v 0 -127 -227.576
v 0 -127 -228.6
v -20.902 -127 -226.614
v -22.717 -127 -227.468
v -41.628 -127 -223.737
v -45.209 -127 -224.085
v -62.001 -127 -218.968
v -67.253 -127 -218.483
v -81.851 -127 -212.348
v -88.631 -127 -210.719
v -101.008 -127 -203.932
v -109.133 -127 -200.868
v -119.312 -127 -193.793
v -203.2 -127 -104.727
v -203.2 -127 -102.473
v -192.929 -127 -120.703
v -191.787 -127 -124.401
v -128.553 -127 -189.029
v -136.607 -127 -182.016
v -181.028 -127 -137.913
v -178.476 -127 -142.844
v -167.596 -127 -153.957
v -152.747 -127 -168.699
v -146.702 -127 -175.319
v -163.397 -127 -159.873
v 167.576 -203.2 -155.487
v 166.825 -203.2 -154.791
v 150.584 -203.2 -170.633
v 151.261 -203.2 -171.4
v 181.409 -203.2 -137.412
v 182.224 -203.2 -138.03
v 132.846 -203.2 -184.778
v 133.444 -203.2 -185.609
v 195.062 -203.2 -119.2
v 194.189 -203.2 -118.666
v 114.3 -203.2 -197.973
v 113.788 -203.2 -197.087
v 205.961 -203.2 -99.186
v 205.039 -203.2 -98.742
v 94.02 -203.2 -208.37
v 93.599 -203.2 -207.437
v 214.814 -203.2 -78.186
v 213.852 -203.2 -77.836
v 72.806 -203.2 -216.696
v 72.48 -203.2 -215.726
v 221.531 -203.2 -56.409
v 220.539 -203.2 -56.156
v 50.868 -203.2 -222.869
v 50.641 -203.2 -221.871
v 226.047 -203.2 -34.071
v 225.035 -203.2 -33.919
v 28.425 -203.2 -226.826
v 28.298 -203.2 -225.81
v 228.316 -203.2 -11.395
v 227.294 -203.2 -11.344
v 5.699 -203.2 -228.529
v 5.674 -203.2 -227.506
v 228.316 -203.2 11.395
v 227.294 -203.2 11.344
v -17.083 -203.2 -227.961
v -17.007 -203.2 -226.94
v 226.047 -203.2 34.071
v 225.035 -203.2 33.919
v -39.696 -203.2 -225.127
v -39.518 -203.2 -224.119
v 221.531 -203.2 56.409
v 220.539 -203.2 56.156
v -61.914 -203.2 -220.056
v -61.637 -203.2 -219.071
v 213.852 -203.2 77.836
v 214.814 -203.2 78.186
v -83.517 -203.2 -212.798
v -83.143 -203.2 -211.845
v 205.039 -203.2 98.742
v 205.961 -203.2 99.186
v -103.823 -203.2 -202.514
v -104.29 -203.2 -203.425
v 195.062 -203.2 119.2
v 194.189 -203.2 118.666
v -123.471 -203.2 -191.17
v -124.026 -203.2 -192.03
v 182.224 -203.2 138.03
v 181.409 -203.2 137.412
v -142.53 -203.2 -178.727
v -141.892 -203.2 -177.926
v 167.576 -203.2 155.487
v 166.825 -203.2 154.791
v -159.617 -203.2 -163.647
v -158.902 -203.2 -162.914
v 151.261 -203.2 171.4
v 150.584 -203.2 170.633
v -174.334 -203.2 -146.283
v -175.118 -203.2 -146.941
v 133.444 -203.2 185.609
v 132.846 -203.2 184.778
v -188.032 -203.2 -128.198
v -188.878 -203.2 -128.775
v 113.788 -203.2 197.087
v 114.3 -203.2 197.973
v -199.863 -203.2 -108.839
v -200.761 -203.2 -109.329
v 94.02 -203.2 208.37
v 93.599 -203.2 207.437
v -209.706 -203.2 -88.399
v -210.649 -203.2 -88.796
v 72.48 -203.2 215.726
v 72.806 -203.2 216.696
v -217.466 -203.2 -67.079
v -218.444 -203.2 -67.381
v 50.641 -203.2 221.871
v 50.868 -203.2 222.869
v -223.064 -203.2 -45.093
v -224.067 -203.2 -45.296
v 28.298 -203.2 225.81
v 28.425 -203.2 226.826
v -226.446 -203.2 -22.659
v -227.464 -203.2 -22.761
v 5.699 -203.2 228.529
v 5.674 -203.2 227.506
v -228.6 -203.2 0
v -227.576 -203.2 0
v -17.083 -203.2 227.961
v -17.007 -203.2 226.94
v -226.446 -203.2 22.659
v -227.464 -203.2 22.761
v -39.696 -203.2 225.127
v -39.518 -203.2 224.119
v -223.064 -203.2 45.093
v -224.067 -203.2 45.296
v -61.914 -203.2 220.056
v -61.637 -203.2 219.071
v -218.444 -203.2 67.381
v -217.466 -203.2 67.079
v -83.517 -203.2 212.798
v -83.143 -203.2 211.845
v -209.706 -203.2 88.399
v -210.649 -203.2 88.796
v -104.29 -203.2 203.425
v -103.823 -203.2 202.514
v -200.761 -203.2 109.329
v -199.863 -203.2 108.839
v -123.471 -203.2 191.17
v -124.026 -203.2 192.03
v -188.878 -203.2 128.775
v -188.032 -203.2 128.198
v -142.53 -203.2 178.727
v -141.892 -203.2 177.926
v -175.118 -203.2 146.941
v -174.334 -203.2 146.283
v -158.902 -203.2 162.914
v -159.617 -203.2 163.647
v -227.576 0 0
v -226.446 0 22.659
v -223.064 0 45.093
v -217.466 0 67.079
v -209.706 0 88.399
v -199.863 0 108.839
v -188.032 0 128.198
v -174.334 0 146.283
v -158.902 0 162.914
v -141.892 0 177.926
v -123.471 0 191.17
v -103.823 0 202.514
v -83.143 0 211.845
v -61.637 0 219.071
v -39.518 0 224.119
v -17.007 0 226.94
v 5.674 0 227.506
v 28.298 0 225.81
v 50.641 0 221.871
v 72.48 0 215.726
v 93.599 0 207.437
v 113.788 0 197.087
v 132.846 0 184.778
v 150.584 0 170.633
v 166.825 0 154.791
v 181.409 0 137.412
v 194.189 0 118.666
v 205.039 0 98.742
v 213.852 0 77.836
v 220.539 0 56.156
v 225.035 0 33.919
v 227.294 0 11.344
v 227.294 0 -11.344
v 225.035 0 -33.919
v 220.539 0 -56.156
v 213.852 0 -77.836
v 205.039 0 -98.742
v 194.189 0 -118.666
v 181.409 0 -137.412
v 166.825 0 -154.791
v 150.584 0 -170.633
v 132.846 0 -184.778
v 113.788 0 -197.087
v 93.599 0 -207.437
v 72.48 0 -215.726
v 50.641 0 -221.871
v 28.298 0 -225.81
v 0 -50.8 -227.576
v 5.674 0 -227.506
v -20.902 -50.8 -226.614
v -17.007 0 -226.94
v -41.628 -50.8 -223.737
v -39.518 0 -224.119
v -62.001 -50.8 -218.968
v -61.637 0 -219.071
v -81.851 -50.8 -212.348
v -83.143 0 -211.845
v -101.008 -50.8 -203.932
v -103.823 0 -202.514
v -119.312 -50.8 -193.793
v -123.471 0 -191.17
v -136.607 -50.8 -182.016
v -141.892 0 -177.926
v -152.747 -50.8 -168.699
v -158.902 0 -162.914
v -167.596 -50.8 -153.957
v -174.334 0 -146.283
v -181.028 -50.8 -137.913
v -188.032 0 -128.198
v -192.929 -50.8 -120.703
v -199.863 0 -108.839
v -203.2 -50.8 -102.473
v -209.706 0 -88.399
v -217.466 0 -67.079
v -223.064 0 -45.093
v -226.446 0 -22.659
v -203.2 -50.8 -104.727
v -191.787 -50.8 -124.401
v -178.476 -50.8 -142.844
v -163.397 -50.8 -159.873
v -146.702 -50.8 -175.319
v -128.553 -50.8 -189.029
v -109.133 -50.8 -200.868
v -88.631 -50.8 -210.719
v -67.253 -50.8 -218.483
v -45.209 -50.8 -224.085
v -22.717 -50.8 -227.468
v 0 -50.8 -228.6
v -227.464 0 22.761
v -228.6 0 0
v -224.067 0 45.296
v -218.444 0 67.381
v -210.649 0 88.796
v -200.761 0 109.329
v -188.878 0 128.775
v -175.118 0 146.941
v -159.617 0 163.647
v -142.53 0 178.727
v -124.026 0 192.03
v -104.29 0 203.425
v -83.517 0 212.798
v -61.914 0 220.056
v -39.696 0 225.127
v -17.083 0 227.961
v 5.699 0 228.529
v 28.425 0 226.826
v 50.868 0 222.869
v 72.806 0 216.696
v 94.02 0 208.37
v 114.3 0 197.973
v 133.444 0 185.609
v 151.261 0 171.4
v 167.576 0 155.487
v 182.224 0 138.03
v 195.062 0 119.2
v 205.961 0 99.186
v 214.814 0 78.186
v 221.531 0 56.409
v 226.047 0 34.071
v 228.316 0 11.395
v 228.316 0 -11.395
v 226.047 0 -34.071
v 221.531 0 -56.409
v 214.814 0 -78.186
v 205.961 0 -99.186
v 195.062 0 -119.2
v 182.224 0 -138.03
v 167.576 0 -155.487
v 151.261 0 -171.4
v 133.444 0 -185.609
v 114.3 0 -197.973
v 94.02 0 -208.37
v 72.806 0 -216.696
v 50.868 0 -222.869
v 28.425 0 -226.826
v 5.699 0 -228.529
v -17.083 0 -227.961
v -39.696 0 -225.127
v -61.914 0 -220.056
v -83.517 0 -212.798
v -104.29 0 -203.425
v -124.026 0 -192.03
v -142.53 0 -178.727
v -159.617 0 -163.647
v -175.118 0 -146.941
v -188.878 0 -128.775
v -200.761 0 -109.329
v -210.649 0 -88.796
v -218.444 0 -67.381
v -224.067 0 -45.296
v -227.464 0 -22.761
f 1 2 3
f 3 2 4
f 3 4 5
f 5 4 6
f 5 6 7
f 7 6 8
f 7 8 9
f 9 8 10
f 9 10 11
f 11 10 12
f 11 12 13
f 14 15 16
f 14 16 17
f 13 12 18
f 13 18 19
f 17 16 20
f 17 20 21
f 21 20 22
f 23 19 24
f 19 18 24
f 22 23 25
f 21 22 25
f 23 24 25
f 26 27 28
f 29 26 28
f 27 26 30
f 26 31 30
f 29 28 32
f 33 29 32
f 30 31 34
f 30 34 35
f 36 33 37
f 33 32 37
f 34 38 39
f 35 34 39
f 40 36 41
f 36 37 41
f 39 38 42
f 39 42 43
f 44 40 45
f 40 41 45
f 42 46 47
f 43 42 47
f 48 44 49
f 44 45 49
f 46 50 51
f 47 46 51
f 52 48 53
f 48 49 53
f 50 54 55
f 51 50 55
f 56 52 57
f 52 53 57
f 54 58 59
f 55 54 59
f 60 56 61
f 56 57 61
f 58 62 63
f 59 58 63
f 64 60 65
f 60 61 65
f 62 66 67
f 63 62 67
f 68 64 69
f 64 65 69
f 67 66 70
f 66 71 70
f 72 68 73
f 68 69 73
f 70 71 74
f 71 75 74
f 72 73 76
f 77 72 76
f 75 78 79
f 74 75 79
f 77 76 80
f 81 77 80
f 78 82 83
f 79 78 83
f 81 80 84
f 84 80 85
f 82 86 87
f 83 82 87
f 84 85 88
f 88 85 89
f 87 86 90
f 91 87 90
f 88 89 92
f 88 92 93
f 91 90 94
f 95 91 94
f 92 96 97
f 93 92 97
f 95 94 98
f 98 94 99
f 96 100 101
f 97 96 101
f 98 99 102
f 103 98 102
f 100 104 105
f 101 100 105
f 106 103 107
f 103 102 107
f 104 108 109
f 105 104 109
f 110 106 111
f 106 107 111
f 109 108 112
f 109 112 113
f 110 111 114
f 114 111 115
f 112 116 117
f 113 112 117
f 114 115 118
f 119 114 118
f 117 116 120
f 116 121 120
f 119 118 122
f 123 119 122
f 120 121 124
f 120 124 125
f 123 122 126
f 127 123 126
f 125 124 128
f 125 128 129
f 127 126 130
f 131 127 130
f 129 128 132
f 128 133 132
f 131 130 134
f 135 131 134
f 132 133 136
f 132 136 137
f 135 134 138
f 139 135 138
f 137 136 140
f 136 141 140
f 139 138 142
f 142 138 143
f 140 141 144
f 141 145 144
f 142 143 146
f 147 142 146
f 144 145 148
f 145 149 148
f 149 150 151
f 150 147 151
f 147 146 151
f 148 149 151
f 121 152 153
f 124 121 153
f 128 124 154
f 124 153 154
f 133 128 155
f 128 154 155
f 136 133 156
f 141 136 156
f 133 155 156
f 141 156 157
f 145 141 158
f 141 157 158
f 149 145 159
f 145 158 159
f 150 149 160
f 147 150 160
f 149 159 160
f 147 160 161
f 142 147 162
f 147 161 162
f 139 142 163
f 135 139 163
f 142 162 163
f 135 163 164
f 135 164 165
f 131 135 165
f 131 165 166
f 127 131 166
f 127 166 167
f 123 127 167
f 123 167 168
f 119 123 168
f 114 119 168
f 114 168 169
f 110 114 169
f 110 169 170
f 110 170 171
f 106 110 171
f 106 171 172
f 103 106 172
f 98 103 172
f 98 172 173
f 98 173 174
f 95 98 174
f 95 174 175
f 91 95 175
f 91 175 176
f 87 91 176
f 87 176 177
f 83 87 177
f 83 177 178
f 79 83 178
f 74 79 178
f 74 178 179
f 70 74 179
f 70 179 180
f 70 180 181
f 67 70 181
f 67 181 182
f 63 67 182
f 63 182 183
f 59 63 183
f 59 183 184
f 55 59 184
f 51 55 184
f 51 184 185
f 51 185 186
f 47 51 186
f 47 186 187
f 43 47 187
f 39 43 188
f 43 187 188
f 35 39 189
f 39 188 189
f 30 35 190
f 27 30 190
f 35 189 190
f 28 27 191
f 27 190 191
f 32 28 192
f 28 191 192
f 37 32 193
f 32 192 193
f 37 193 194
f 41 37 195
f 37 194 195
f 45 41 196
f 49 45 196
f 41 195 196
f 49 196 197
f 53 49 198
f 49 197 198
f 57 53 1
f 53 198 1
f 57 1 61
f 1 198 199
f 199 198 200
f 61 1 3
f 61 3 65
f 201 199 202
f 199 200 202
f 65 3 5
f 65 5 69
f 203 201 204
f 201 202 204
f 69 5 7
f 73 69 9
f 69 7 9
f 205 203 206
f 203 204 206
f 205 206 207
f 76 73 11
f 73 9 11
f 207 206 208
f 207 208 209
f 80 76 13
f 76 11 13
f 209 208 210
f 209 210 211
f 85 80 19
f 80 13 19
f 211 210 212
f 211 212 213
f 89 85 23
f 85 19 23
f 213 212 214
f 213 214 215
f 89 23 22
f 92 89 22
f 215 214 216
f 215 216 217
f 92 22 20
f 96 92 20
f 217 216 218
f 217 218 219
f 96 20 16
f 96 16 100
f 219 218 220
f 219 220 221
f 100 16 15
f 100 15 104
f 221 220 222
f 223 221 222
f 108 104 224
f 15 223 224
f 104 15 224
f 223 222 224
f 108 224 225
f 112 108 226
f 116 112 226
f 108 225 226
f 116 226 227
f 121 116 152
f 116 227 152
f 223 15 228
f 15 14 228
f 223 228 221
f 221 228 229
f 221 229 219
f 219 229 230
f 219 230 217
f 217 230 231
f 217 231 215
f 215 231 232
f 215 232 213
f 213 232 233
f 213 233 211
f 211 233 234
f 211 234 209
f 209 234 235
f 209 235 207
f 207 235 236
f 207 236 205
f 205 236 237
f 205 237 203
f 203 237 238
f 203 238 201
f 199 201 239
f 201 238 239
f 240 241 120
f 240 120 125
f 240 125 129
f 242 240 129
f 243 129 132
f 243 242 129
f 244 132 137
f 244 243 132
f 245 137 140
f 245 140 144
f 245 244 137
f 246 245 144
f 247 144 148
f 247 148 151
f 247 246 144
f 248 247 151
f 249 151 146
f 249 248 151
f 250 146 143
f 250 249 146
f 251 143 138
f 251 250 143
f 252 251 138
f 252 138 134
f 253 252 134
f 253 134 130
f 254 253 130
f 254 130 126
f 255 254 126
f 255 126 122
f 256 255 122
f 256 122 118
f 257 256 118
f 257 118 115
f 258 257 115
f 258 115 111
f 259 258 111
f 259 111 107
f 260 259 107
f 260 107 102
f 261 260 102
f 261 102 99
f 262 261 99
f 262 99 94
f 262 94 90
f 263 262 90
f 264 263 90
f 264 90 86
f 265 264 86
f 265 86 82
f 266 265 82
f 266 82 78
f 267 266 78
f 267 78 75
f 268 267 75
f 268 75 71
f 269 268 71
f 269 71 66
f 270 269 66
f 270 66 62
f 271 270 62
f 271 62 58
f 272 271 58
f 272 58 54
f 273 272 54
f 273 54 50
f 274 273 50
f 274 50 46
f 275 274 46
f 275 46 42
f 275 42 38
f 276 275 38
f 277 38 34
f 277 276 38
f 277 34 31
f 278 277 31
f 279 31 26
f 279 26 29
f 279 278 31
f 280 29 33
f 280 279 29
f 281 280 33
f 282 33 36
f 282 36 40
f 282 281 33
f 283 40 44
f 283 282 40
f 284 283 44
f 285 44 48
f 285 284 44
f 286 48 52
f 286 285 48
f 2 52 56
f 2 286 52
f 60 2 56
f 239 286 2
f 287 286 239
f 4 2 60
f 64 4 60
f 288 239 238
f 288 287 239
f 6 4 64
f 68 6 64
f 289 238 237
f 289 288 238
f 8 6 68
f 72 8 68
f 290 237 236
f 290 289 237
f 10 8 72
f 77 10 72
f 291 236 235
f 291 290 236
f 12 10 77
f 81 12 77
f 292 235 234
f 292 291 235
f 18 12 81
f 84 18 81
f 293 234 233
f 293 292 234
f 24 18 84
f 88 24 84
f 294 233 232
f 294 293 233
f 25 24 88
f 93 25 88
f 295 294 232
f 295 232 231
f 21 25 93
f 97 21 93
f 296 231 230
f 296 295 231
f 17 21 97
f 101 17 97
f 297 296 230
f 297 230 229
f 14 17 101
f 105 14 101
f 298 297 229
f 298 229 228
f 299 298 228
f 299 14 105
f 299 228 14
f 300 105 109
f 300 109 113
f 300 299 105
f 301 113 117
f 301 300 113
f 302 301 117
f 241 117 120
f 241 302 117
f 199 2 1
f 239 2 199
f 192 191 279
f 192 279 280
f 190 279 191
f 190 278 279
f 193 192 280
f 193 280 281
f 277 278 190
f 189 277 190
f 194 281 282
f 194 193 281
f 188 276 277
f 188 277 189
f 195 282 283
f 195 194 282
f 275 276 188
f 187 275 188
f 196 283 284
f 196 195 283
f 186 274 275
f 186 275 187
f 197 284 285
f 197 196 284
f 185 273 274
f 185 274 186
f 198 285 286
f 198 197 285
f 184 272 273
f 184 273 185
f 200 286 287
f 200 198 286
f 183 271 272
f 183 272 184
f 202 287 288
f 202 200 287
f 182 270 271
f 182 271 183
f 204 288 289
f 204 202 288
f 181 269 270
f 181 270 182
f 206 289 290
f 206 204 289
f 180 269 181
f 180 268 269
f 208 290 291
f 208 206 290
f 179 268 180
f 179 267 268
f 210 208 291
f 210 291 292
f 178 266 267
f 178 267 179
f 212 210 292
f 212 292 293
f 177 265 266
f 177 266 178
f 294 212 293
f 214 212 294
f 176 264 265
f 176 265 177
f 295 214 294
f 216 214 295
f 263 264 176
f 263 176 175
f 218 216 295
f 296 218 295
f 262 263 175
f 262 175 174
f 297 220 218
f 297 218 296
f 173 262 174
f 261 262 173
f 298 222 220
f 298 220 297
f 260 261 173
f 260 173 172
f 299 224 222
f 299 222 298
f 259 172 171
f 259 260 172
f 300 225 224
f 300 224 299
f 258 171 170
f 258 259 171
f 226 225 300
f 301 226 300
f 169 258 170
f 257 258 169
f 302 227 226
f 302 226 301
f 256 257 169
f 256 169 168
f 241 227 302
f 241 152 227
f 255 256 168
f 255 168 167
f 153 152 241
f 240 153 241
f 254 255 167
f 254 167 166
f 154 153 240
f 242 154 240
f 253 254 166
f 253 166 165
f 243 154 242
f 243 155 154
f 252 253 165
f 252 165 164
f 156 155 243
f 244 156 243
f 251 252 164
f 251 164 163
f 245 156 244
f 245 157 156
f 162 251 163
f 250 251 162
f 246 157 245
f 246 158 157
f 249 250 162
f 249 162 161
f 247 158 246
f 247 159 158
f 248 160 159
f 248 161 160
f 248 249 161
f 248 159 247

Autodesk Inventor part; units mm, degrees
ref_plane "YZ Plane" through (0, 0, 0) normal (1, 0, 0) x (0, 1, 0)
ref_plane "XZ Plane" through (0, 0, 0) normal (0, 1, 0) x (-1, 0, 0)
ref_plane "XY Plane" through (0, 0, 0) normal (0, 0, 1) x (1, 0, 0)
sketch "Sketch1" plane through (0, 0, 0) normal (0, 1, 0) x (-1, 0, 0)
  circle A0 centre (0, 0) radius 228.6
  circle A1 centre (0, 0) radius 227.5764
  line L0 (0, 0) -> (0, 228.6) construction
  line L1 (0, 0) -> (-228.6, 0) construction
  line L2 (0, 0) -> (228.6, 0) construction
  line L3 (0, 0) -> (0, -228.6) construction
  dimension "d0" = 1.0236
  dimension "d1" = 457.2
ref_plane "Work Plane1" through (0, 0, 228.6) normal (0, 0, 1) x (1, 0, 0)
ref_plane "Work Plane2" through (-228.6, 0, 0) normal (-1, 0, 0) x (0, -1, 0)
ref_plane "Work Plane3" through (0, 0, -228.6) normal (0, 0, -1) x (-1, 0, 0)
ref_plane "Work Plane4" through (228.6, 0, 0) normal (1, 0, 0) x (0, 1, 0)
extrude "Extrusion1" add sketch "Sketch1" against normal blind 203.2
sketch "Sketch2" plane through (0, 0, -228.6) normal (0, 0, -1) x (-1, 0, 0)
  line L0 (-228.6, -203.2) -> (228.6, -203.2) construction
  line L1 (0, 0) -> (0, -50.8) construction
  line L2 (0, -127) -> (0, -50.8) construction
  line L3 (0, -127) -> (25.4, -127)
  line L4 (25.4, -127) -> (25.4, -50.8)
  line L5 (25.4, -50.8) -> (0, -50.8)
  line L6 (0, -127) -> (0, -50.8)
  line L7 (-228.6, 0) -> (-228.6, -203.2) projected
  point P0 (228.6, 0)
  dimension "d4" = 50.8
  dimension "d9" = 76.2
  dimension "d10" = 25.4
extrude "Extrusion2" cut sketch "Sketch2" against normal blind 228.6
sketch "Sketch3" plane through (0, 0, -228.6) normal (0, 0, -1) x (-1, 0, 0)
  line L0 (0, -127) -> (25.4, -127) projected
  line L1 (203.2, -50.8) -> (0, -50.8)
  line L2 (0, -50.8) -> (0, -127)
  line L3 (0, -127) -> (203.2, -127)
  line L4 (203.2, -127) -> (203.2, -50.8)
  point P0 (0, 0)
  point P1 (203.2, -133.35)
extrude "Extrusion3" cut sketch "Sketch3" against normal blind 228.6
properties part number "Cyclone Main Straight Metal"
